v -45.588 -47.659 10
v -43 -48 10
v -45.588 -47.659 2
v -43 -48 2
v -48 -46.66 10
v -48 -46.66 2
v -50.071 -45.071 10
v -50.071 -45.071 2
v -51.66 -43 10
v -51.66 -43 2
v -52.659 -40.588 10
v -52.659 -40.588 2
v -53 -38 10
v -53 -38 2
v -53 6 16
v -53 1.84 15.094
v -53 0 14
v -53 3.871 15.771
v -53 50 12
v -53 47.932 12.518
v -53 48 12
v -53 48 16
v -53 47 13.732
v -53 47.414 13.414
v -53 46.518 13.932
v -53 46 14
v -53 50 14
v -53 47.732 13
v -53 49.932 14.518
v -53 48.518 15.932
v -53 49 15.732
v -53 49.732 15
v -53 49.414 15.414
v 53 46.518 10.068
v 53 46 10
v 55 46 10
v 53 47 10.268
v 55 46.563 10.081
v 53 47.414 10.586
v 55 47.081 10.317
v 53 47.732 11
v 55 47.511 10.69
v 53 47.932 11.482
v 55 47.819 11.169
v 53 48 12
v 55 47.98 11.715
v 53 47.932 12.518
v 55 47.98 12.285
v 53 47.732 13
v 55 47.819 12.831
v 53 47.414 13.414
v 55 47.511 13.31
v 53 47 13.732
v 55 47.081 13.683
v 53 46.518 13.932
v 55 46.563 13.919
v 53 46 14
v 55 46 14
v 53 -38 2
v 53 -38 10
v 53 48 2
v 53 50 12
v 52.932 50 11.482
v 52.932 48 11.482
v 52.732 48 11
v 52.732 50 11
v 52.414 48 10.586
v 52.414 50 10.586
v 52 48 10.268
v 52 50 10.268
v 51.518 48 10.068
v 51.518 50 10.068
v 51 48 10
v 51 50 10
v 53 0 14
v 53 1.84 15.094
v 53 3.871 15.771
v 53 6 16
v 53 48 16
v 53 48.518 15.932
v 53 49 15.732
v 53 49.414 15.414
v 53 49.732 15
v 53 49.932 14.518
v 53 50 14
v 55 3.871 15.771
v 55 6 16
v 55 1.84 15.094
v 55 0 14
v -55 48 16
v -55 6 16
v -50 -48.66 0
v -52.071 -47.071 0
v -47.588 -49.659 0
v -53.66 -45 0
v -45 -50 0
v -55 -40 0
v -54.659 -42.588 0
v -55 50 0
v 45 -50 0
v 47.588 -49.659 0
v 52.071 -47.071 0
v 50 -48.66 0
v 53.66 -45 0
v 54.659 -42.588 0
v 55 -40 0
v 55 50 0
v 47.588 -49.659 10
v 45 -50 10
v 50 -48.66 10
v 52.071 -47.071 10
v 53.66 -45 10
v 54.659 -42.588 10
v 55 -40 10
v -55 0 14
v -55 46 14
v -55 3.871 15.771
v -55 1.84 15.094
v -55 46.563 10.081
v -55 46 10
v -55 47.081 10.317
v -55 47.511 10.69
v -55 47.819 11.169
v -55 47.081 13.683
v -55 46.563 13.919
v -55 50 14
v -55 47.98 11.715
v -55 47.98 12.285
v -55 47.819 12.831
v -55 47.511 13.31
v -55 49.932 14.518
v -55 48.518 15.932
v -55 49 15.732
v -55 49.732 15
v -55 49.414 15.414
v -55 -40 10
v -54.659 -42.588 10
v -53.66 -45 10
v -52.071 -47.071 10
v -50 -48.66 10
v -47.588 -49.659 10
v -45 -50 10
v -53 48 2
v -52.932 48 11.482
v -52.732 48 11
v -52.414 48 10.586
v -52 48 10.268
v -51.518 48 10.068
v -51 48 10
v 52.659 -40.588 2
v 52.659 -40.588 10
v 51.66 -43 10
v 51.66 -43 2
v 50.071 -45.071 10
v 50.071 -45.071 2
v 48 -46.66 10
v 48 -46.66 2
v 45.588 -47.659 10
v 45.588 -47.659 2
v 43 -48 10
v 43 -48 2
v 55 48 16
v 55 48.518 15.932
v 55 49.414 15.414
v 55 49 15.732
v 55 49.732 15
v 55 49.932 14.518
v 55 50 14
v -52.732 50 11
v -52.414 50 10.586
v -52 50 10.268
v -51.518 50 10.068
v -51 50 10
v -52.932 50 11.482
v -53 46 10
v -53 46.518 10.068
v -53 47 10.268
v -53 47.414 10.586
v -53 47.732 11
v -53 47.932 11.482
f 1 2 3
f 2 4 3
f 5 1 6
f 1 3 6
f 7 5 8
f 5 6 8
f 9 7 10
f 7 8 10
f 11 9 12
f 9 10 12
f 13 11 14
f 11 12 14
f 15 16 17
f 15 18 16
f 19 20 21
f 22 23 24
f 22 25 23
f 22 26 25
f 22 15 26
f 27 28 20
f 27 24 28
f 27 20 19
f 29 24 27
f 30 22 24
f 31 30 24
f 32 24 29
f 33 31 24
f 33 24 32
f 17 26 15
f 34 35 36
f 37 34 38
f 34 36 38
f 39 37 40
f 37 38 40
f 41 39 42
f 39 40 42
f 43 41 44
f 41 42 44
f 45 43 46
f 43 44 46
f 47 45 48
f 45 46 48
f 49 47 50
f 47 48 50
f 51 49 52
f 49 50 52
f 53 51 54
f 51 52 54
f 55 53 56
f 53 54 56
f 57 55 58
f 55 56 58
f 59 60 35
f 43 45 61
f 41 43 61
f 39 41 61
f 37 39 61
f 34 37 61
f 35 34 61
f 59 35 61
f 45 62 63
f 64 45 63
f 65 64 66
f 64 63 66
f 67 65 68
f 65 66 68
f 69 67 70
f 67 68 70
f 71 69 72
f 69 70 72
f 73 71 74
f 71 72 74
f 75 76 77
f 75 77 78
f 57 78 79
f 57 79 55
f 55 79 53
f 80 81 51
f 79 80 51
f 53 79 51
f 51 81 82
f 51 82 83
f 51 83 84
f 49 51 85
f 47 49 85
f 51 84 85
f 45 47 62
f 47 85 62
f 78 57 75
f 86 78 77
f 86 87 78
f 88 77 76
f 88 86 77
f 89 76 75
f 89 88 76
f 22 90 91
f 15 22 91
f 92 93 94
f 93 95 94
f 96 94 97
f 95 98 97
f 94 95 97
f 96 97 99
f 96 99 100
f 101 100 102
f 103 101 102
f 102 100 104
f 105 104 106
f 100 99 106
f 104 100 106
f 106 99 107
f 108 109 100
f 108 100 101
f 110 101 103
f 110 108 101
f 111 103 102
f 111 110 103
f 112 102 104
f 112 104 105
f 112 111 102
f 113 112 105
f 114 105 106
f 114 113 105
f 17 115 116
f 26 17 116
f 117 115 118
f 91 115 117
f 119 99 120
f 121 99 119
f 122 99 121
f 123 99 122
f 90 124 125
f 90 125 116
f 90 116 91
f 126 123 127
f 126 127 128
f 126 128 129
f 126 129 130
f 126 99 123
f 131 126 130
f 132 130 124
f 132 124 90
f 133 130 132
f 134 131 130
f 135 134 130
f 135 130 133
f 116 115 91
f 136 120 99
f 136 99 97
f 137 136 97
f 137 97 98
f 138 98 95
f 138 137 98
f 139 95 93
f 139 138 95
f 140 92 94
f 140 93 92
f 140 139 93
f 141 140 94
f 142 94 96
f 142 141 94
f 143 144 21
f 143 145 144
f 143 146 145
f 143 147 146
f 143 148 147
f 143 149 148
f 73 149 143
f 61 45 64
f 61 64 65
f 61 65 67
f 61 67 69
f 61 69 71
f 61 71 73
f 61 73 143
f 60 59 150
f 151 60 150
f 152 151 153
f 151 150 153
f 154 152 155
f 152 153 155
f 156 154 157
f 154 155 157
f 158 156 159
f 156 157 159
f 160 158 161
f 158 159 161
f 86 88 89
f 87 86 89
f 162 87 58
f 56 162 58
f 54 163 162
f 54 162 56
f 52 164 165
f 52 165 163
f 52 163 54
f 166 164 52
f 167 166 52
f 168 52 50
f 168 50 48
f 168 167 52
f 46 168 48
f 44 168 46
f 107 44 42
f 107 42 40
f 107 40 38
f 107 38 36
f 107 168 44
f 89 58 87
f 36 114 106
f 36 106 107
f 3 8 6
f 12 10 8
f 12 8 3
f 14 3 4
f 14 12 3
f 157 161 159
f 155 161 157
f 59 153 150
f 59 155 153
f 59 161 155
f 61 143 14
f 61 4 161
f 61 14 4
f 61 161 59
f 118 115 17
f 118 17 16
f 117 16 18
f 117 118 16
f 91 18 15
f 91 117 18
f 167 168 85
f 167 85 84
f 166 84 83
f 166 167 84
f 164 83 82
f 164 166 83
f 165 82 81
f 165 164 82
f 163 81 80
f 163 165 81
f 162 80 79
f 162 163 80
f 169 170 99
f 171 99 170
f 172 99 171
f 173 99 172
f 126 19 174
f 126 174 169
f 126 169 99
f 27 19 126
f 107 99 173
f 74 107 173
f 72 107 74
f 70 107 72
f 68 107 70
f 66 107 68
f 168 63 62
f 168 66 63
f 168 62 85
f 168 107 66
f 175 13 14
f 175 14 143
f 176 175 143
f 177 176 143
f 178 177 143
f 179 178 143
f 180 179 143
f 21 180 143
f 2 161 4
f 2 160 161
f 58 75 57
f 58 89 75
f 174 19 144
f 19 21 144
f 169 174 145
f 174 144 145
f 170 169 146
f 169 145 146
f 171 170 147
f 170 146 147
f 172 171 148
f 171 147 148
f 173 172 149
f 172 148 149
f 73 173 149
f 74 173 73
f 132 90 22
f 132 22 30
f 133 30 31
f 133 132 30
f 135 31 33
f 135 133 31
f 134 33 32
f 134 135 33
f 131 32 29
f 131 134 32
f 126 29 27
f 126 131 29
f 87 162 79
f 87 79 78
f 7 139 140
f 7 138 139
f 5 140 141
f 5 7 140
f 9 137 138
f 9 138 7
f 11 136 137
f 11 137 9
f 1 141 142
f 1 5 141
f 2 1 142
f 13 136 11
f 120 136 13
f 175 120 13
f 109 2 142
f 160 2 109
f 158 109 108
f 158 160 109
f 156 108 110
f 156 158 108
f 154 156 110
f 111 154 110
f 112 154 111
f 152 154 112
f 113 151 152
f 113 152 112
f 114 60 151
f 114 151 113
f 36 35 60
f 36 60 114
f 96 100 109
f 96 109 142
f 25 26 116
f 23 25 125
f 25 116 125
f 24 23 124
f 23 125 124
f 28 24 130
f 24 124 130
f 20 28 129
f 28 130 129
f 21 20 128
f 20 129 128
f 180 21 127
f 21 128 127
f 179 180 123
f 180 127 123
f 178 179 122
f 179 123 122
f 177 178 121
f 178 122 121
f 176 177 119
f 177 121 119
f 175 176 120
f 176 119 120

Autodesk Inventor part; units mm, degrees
ref_plane "YZ Plane" through (0, 0, 0) normal (1, 0, 0) x (0, 1, 0)
ref_plane "XZ Plane" through (0, 0, 0) normal (0, 1, 0) x (-1, 0, 0)
ref_plane "XY Plane" through (0, 0, 0) normal (0, 0, 1) x (1, 0, 0)
sketch "Sketch1" plane through (0, 0, 0) normal (0, 0, 1) x (1, 0, 0)
  line L0 (55, -50) -> (-55, -50)
  line L1 (-55, -50) -> (-55, 50)
  line L2 (-55, 50) -> (55, 50)
  line L3 (55, 50) -> (55, -50)
  line L4 (55, -50) -> (-55, 50) construction
  line L5 (-55, -50) -> (55, 50) construction
  point P0 (0, 0)
  dimension "d0" = 110
  dimension "d1" = 100
extrude "Extrusion1" add sketch "Sketch1" along normal blind 10
sketch "Sketch2" plane through (0, 0, 10) normal (0, 0, 1) x (1, 0, 0)
  line L0 (53, -48) -> (-53, -48)
  line L1 (-53, -48) -> (-53, 48)
  line L2 (-53, 48) -> (53, 48)
  line L3 (53, 48) -> (53, -48)
  line L4 (53, -48) -> (-53, 48) construction
  line L5 (-53, -48) -> (53, 48) construction
  point P0 (0, 0)
  dimension "d4" = 106
  dimension "d5" = 96
extrude "Extrusion2" cut sketch "Sketch2" against normal blind 8
fillet "Fillet1" radius 10 4 edges at (-55, -50, 5) (-53, -48, 6) (55, -50, 5) (53, -48, 6)
sketch "Sketch3" plane through (-55, 50, 0) normal (-1, 0, 0) x (0, 0, 1)
  line L0 (0, 0) -> (10, 0) projected
  line L1 (10, 0) -> (16, 0)
  line L2 (16, 0) -> (16, -50)
  line L3 (16, -50) -> (14, -50)
  line L4 (14, -50) -> (14, -2)
  line L5 (14, -2) -> (10, -2)
  line L6 (10, -90) -> (10, 0) projected
  point P0 (0, -50)
  dimension "d9" = 50
  dimension "d10" = 6
  dimension "d11" = 4
  dimension "d12" = 2
extrude "Extrusion3" add sketch "Sketch3" against normal blind 2
sketch "Sketch4" plane through (55, 50, 10) normal (1, 0, 0) x (0, 0, -1)
  line L0 (10, 0) -> (0, 0) projected
  line L1 (10, 0) -> (-6, 0) projected
  line L2 (0, 0) -> (-6, 0)
  line L3 (-6, 0) -> (-6, -50) projected
  line L4 (-6, 0) -> (-6, -50)
  line L5 (-6, -50) -> (-4, -50) projected
  line L6 (-6, -50) -> (-4, -50)
  line L7 (-4, -50) -> (-4, -2) projected
  line L8 (-4, -50) -> (-4, -2)
  line L9 (-4, -2) -> (0, -2)
  line L10 (0, -90) -> (0, 0) projected
  point P0 (10, -50)
extrude "Extrusion4" add sketch "Sketch4" against normal blind 2
fillet "Fillet2" radius 10 2 edges at (-54, 0, 16) (54, 0, 16)
fillet "Fillet3" radius 2 8 edges at (-54, 50, 16) (54, 50, 16) (-54, 48, 14) (54, 48, 14) (54, 48, 10) (-54, 48, 10) (-53, 49, 10) (53, 49, 10)
properties part number "backpack"
